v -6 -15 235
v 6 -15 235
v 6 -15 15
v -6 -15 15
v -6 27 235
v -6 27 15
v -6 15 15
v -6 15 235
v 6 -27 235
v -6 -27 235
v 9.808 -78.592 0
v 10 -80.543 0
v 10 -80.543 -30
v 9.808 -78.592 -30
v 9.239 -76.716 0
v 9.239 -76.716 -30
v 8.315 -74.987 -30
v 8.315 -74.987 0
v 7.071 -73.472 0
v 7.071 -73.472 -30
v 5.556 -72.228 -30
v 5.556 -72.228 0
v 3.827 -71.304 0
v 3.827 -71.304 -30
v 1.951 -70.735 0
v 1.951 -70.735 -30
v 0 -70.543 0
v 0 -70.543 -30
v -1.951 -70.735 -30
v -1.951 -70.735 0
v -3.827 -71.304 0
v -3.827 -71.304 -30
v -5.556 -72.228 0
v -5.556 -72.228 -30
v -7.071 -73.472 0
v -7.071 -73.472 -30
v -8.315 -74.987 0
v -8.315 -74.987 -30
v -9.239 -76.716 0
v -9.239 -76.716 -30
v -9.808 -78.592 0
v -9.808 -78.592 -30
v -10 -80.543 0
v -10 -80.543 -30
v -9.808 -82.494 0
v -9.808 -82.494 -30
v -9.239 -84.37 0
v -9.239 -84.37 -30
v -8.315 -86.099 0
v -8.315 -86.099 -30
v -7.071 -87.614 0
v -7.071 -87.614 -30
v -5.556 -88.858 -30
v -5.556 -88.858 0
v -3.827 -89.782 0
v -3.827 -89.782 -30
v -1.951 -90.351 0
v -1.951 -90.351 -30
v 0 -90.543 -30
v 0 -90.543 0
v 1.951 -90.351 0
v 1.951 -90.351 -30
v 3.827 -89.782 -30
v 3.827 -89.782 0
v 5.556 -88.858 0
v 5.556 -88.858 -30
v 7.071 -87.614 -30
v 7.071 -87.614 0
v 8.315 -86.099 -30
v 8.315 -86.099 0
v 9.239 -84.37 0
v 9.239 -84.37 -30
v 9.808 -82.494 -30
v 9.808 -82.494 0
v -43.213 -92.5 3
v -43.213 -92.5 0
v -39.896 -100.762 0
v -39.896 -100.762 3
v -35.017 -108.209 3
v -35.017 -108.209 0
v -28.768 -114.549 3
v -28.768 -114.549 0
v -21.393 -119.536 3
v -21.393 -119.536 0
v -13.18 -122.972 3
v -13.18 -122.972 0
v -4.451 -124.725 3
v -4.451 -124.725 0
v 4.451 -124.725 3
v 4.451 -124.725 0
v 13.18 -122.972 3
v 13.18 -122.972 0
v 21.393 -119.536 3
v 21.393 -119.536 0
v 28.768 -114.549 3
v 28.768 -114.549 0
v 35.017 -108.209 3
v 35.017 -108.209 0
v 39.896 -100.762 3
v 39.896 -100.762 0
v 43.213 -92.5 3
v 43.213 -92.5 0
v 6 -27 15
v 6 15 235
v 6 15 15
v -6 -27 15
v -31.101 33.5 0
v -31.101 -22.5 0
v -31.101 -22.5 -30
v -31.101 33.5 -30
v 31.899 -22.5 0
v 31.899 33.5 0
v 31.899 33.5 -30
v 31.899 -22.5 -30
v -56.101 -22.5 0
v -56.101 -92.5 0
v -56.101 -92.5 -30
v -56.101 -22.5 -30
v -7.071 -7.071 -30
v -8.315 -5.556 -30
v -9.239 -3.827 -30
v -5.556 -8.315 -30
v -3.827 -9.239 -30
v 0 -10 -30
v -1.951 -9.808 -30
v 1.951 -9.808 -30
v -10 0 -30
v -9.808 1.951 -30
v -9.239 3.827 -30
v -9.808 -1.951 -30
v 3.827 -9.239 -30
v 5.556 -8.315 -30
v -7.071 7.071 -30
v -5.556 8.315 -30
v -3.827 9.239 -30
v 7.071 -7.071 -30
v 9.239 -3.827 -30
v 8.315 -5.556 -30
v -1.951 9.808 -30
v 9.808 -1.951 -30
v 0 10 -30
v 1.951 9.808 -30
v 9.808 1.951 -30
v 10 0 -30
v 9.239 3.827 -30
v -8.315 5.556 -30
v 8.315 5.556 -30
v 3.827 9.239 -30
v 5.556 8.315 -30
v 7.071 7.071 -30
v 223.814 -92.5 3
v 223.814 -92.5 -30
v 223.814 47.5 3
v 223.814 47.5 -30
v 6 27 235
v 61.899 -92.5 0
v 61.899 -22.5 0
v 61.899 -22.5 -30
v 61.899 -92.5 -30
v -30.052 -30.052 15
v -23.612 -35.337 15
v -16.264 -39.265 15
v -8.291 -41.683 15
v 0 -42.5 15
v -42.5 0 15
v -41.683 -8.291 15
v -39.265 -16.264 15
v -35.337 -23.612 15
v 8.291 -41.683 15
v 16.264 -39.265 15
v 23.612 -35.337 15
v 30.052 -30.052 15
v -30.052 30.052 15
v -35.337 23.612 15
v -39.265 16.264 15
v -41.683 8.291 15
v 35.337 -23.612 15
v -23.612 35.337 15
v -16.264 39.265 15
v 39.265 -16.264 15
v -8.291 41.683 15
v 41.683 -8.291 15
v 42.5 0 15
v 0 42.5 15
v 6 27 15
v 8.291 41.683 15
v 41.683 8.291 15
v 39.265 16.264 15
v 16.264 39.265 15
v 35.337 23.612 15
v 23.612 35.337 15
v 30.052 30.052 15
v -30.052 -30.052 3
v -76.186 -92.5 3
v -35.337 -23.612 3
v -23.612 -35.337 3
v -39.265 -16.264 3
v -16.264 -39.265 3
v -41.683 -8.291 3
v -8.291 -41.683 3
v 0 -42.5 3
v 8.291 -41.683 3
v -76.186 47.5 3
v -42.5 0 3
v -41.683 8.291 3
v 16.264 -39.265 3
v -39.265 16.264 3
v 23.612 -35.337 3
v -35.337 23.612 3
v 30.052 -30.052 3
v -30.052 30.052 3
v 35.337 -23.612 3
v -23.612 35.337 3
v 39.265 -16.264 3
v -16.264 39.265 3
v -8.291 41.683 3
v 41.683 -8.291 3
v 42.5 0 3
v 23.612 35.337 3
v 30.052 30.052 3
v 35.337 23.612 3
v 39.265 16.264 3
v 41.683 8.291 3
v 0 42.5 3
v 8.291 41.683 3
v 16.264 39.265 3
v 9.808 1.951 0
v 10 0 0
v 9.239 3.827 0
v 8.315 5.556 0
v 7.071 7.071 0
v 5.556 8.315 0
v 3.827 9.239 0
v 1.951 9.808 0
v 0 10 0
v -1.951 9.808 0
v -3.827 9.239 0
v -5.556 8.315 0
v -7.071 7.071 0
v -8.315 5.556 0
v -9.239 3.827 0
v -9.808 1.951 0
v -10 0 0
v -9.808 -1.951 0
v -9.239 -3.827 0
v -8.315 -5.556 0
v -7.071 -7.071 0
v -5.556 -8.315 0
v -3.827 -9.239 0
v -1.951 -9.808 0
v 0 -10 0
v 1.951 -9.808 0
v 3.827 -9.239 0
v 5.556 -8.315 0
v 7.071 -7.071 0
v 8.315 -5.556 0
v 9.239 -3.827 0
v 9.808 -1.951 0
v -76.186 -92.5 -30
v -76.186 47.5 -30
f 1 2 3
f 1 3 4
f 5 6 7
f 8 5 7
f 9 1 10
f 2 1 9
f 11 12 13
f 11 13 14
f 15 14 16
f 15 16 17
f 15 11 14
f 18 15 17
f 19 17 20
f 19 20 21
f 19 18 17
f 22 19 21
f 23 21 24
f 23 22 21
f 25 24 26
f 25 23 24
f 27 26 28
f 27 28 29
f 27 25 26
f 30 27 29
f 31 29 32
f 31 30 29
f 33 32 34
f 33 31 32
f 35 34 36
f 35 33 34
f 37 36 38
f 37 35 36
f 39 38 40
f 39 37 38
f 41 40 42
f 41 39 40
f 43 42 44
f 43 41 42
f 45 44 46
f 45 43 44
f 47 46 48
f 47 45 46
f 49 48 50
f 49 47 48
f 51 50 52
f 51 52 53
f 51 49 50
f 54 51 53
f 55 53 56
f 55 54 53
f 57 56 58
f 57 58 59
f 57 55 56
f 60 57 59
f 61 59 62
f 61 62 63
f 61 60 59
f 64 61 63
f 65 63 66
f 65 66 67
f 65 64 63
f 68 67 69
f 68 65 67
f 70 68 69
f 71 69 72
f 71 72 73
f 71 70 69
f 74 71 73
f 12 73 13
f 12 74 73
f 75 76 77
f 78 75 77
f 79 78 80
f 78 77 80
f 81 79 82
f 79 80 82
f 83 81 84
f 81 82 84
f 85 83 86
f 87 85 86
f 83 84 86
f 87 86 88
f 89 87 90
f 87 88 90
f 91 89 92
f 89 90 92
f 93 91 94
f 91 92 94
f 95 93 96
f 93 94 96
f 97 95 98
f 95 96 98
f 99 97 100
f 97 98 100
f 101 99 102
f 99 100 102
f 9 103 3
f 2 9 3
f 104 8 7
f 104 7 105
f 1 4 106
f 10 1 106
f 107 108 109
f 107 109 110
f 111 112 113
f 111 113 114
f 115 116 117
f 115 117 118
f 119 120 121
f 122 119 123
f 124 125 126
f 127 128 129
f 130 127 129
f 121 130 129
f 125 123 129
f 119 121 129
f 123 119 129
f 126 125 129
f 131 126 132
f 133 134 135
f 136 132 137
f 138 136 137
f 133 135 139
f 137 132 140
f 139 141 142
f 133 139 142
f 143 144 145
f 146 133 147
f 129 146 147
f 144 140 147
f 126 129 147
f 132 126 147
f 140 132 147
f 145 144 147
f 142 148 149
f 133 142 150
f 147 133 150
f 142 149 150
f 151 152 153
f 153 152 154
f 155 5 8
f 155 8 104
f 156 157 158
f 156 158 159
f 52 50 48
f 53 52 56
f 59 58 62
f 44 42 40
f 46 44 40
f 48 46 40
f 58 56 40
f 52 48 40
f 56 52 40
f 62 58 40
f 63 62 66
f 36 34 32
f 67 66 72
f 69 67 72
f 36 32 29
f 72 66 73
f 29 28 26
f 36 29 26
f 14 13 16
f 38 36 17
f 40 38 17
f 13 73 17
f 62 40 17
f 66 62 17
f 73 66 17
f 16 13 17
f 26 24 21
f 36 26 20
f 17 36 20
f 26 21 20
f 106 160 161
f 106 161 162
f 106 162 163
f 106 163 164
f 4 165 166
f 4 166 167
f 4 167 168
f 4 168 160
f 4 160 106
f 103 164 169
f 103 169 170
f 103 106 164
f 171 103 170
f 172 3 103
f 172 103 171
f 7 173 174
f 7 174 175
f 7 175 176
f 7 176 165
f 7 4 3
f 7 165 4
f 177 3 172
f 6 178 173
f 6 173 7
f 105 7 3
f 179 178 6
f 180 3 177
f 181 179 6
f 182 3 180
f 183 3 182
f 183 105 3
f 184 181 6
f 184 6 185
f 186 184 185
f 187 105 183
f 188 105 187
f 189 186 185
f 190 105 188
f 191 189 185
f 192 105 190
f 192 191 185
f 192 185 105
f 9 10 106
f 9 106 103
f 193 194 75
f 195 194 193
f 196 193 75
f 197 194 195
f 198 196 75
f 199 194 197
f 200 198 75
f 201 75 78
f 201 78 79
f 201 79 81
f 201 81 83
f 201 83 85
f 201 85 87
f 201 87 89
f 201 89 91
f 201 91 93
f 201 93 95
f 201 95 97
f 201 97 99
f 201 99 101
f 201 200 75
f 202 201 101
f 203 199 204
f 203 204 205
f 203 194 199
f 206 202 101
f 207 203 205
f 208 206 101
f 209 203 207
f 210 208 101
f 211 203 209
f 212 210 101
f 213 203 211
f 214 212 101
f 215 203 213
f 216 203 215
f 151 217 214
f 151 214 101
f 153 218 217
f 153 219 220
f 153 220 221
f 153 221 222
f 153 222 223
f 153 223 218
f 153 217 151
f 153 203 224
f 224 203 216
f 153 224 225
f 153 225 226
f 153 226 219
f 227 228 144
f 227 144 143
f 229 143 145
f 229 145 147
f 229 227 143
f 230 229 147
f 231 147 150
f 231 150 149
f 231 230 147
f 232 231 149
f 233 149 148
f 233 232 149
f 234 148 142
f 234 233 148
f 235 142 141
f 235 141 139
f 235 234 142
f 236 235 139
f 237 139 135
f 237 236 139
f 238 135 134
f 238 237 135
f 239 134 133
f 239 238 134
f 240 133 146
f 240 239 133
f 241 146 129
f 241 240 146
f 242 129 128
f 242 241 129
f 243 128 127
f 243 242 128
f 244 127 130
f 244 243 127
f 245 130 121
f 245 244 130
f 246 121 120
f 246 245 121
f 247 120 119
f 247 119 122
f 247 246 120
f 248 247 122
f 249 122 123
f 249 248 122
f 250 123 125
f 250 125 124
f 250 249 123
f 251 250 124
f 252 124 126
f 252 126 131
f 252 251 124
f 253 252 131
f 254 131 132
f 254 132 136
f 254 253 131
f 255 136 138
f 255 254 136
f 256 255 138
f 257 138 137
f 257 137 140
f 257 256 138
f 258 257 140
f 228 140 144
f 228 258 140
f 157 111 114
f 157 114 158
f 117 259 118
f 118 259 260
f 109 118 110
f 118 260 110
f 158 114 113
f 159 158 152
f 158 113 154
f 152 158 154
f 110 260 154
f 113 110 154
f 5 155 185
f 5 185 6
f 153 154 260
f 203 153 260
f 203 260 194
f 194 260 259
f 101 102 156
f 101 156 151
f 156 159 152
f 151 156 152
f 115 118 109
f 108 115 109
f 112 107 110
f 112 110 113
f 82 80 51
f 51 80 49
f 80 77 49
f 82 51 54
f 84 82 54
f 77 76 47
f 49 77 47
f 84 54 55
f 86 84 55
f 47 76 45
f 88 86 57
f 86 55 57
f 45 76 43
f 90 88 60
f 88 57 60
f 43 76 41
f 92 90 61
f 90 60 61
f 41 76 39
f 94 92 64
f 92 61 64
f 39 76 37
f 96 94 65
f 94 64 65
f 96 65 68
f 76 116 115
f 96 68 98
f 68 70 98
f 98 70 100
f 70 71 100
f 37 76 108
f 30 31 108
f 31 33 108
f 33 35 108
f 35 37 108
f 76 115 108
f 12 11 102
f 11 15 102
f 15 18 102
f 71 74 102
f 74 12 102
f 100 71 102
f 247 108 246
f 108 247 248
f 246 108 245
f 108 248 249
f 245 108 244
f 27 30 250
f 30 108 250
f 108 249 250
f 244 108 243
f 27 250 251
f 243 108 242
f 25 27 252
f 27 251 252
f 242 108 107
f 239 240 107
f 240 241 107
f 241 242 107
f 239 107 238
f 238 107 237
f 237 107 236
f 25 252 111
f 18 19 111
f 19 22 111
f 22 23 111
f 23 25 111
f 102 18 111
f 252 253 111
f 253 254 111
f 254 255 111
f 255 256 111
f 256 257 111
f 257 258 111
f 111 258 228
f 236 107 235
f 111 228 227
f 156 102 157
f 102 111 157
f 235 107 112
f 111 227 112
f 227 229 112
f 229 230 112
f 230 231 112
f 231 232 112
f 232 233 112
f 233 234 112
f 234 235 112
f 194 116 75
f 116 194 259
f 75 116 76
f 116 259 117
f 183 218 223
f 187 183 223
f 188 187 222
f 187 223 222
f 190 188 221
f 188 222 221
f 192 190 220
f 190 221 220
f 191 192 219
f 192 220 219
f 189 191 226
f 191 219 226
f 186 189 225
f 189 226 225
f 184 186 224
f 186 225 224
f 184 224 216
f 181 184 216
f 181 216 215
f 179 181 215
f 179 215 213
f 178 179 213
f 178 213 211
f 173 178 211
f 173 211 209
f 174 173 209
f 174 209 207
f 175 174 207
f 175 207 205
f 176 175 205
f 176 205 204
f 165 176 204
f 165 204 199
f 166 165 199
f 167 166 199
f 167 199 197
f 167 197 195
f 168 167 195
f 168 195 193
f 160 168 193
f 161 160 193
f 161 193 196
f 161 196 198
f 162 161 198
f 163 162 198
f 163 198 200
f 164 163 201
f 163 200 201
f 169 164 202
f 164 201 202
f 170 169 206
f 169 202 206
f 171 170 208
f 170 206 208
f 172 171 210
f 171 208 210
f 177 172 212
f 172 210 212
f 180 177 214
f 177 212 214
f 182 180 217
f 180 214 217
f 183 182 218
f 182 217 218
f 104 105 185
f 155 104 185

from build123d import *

# Parameters (mm, degrees)
F0_R      = 42.5
F1_DEPTH  = 15
F3_DEPTH  = 30
F2_R      = 22.5
F4_DEPTH  = 3
F5_R      = 10
F6_DEPTH  = 30
F7_DEPTH  = 15
F8_R      = 10
F9_DEPTH  = 30
F11_DEPTH = 220


with BuildPart() as f1:
    # F0 (on Top) → F1 (new body)
    with BuildSketch(Plane.XY):
        Circle(F0_R)
    extrude(amount=F1_DEPTH)

    # F2 (on Top) → F3 (join)
    with BuildSketch(Plane.XY):
        Polygon((223.814484, 47.5), (-76.185516, 47.5), (-76.185516, -92.5), (-56.101405, -92.5), (-56.101405, -22.5), (-31.101405, -22.5), (-31.101405, 33.5), (31.898595, 33.5), (31.898595, -22.5), (61.898595, -22.5), (61.898595, -92.5), (223.814484, -92.5), align=None)
    extrude(amount=-F3_DEPTH)

    # F2 (on Top) → F4 (join)
    with BuildSketch(Plane.XY):
        Polygon((223.814484, 47.5), (-76.185516, 47.5), (-76.185516, -92.5), (-56.101405, -92.5), (-56.101405, -22.5), (-31.101405, -22.5), (-31.101405, 33.5), (31.898595, 33.5), (31.898595, -22.5), (61.898595, -22.5), (61.898595, -92.5), (223.814484, -92.5), align=None)
        with BuildLine():
            Line((-56.101405, -22.5), (-56.101405, -92.5))
            Line((-56.101405, -92.5), (-43.213305, -92.5))
            ThreePointArc((-43.213305, -92.5), (-6.340398, -35.394619), (45, -79.945706))
            ThreePointArc((45, -79.945706), (44.551087, -86.286104), (43.213305, -92.5))
            Line((43.213305, -92.5), (61.898595, -92.5))
            Line((61.898595, -92.5), (61.898595, -22.5))
            Line((61.898595, -22.5), (31.898595, -22.5))
            Line((31.898595, -22.5), (31.898595, 33.5))
            Line((31.898595, 33.5), (-31.101405, 33.5))
            Line((-31.101405, 33.5), (-31.101405, -22.5))
            Line((-31.101405, -22.5), (-56.101405, -22.5))
        make_face()
        Circle(F2_R, mode=Mode.SUBTRACT)
        with BuildLine():
            ThreePointArc((45, -79.945706), (-6.340398, -35.394619), (-43.213305, -92.5))
            ThreePointArc((-43.213305, -92.5), (0, -124.945706), (43.213305, -92.5))
            ThreePointArc((43.213305, -92.5), (44.551087, -86.286104), (45, -79.945706))
        make_face()
    extrude(amount=F4_DEPTH)

    # F5 (on Top) → F6 (join)
    with BuildSketch(Plane.XY):
        Circle(F5_R)
    extrude(amount=-F6_DEPTH)

    # F5 (on Top) → F7 (join)
    with BuildSketch(Plane.XY):
        Circle(F5_R)
    extrude(amount=F7_DEPTH)

    # F8 (on Top) → F9 (join)
    with BuildSketch(Plane.XY):
        with Locations((0, -80.542963)):
            Circle(F8_R)
    extrude(amount=-F9_DEPTH)

    # F10 (on face) → F11 (join)
    with BuildSketch(Plane.XY.offset(15)):
        Polygon((-6, 27), (-6, 15), (0, 15), (6, 15), (6, 27), align=None)
        Polygon((6, -15), (0, -15), (-6, -15), (-6, -27), (6, -27), align=None)
    extrude(amount=F11_DEPTH)


solid = f1.part
